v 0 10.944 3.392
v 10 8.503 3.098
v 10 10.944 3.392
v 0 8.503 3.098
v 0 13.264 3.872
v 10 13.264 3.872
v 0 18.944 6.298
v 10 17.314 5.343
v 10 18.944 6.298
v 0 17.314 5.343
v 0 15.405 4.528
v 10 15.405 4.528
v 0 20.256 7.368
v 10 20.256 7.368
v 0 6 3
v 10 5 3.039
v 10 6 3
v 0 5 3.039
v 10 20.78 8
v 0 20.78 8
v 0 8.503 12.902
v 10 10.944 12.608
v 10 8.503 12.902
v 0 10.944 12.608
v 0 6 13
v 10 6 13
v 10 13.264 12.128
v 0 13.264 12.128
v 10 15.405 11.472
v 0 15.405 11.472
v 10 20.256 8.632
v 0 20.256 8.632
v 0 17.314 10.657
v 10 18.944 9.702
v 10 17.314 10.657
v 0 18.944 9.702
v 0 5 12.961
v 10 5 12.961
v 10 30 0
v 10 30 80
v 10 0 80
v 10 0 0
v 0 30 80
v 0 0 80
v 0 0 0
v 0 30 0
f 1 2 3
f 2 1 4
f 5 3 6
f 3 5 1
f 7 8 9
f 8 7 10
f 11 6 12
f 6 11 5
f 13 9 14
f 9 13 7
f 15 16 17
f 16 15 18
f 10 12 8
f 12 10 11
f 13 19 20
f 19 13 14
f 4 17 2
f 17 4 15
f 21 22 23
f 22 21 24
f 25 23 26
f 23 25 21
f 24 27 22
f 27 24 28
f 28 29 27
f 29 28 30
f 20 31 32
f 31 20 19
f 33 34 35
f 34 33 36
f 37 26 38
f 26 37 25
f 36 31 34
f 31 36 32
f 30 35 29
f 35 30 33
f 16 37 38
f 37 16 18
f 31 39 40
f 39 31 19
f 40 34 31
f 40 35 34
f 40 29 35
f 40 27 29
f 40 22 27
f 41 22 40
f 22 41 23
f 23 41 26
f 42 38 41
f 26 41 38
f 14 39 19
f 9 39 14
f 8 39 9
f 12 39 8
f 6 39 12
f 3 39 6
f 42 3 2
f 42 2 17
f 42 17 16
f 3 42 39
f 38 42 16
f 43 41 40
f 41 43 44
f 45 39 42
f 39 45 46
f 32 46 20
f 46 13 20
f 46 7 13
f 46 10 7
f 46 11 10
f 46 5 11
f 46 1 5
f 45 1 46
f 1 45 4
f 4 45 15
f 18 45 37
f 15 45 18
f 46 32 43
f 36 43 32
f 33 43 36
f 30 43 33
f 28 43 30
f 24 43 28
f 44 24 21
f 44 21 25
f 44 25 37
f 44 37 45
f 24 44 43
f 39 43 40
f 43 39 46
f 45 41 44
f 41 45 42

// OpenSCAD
$fn=40;

module poly()
{
    intersection() 
    {
        {
        DX = 6;
        DY = 4;
        D = 16;
        
        scale([1,2,1]) cylinder(h=20, d=D);
        scale([1,2,1]) translate([-DX,0,0]) cylinder(h=20, d=D);
        //translate([-DX/2,DY,0]) cylinder(h=20, d=D);
        translate([-20, -1, -20]) cube(size=[40, 40, 40]);
        }
    }
    /*
    linear_extrude(height=20) {
        p = [[0,0], [10,0], 
            [9, 5], [7.5,8],
            [5,10],
            [2.5,8], [1,5]];
        //bezier(0, 0, 0, p);
        //echo(p[0]);
        polygon(points=p);
        
        minkowski() {
            //p = [[0,0], [10,0], [7,7], [5,10], [3,7]];
            p = [[0,0], [10,0], [5,10]];
            polygon(points=p);
            circle(radius=1, $fn=20);
        }
    }
    */
}

difference() 
{
    cube(size=[10, 30, 80]);
    translate([12, 5, 10]) 
    {
        rotate([0, -90, 0])
        translate([1, 1, 0]) poly();
    }
}
